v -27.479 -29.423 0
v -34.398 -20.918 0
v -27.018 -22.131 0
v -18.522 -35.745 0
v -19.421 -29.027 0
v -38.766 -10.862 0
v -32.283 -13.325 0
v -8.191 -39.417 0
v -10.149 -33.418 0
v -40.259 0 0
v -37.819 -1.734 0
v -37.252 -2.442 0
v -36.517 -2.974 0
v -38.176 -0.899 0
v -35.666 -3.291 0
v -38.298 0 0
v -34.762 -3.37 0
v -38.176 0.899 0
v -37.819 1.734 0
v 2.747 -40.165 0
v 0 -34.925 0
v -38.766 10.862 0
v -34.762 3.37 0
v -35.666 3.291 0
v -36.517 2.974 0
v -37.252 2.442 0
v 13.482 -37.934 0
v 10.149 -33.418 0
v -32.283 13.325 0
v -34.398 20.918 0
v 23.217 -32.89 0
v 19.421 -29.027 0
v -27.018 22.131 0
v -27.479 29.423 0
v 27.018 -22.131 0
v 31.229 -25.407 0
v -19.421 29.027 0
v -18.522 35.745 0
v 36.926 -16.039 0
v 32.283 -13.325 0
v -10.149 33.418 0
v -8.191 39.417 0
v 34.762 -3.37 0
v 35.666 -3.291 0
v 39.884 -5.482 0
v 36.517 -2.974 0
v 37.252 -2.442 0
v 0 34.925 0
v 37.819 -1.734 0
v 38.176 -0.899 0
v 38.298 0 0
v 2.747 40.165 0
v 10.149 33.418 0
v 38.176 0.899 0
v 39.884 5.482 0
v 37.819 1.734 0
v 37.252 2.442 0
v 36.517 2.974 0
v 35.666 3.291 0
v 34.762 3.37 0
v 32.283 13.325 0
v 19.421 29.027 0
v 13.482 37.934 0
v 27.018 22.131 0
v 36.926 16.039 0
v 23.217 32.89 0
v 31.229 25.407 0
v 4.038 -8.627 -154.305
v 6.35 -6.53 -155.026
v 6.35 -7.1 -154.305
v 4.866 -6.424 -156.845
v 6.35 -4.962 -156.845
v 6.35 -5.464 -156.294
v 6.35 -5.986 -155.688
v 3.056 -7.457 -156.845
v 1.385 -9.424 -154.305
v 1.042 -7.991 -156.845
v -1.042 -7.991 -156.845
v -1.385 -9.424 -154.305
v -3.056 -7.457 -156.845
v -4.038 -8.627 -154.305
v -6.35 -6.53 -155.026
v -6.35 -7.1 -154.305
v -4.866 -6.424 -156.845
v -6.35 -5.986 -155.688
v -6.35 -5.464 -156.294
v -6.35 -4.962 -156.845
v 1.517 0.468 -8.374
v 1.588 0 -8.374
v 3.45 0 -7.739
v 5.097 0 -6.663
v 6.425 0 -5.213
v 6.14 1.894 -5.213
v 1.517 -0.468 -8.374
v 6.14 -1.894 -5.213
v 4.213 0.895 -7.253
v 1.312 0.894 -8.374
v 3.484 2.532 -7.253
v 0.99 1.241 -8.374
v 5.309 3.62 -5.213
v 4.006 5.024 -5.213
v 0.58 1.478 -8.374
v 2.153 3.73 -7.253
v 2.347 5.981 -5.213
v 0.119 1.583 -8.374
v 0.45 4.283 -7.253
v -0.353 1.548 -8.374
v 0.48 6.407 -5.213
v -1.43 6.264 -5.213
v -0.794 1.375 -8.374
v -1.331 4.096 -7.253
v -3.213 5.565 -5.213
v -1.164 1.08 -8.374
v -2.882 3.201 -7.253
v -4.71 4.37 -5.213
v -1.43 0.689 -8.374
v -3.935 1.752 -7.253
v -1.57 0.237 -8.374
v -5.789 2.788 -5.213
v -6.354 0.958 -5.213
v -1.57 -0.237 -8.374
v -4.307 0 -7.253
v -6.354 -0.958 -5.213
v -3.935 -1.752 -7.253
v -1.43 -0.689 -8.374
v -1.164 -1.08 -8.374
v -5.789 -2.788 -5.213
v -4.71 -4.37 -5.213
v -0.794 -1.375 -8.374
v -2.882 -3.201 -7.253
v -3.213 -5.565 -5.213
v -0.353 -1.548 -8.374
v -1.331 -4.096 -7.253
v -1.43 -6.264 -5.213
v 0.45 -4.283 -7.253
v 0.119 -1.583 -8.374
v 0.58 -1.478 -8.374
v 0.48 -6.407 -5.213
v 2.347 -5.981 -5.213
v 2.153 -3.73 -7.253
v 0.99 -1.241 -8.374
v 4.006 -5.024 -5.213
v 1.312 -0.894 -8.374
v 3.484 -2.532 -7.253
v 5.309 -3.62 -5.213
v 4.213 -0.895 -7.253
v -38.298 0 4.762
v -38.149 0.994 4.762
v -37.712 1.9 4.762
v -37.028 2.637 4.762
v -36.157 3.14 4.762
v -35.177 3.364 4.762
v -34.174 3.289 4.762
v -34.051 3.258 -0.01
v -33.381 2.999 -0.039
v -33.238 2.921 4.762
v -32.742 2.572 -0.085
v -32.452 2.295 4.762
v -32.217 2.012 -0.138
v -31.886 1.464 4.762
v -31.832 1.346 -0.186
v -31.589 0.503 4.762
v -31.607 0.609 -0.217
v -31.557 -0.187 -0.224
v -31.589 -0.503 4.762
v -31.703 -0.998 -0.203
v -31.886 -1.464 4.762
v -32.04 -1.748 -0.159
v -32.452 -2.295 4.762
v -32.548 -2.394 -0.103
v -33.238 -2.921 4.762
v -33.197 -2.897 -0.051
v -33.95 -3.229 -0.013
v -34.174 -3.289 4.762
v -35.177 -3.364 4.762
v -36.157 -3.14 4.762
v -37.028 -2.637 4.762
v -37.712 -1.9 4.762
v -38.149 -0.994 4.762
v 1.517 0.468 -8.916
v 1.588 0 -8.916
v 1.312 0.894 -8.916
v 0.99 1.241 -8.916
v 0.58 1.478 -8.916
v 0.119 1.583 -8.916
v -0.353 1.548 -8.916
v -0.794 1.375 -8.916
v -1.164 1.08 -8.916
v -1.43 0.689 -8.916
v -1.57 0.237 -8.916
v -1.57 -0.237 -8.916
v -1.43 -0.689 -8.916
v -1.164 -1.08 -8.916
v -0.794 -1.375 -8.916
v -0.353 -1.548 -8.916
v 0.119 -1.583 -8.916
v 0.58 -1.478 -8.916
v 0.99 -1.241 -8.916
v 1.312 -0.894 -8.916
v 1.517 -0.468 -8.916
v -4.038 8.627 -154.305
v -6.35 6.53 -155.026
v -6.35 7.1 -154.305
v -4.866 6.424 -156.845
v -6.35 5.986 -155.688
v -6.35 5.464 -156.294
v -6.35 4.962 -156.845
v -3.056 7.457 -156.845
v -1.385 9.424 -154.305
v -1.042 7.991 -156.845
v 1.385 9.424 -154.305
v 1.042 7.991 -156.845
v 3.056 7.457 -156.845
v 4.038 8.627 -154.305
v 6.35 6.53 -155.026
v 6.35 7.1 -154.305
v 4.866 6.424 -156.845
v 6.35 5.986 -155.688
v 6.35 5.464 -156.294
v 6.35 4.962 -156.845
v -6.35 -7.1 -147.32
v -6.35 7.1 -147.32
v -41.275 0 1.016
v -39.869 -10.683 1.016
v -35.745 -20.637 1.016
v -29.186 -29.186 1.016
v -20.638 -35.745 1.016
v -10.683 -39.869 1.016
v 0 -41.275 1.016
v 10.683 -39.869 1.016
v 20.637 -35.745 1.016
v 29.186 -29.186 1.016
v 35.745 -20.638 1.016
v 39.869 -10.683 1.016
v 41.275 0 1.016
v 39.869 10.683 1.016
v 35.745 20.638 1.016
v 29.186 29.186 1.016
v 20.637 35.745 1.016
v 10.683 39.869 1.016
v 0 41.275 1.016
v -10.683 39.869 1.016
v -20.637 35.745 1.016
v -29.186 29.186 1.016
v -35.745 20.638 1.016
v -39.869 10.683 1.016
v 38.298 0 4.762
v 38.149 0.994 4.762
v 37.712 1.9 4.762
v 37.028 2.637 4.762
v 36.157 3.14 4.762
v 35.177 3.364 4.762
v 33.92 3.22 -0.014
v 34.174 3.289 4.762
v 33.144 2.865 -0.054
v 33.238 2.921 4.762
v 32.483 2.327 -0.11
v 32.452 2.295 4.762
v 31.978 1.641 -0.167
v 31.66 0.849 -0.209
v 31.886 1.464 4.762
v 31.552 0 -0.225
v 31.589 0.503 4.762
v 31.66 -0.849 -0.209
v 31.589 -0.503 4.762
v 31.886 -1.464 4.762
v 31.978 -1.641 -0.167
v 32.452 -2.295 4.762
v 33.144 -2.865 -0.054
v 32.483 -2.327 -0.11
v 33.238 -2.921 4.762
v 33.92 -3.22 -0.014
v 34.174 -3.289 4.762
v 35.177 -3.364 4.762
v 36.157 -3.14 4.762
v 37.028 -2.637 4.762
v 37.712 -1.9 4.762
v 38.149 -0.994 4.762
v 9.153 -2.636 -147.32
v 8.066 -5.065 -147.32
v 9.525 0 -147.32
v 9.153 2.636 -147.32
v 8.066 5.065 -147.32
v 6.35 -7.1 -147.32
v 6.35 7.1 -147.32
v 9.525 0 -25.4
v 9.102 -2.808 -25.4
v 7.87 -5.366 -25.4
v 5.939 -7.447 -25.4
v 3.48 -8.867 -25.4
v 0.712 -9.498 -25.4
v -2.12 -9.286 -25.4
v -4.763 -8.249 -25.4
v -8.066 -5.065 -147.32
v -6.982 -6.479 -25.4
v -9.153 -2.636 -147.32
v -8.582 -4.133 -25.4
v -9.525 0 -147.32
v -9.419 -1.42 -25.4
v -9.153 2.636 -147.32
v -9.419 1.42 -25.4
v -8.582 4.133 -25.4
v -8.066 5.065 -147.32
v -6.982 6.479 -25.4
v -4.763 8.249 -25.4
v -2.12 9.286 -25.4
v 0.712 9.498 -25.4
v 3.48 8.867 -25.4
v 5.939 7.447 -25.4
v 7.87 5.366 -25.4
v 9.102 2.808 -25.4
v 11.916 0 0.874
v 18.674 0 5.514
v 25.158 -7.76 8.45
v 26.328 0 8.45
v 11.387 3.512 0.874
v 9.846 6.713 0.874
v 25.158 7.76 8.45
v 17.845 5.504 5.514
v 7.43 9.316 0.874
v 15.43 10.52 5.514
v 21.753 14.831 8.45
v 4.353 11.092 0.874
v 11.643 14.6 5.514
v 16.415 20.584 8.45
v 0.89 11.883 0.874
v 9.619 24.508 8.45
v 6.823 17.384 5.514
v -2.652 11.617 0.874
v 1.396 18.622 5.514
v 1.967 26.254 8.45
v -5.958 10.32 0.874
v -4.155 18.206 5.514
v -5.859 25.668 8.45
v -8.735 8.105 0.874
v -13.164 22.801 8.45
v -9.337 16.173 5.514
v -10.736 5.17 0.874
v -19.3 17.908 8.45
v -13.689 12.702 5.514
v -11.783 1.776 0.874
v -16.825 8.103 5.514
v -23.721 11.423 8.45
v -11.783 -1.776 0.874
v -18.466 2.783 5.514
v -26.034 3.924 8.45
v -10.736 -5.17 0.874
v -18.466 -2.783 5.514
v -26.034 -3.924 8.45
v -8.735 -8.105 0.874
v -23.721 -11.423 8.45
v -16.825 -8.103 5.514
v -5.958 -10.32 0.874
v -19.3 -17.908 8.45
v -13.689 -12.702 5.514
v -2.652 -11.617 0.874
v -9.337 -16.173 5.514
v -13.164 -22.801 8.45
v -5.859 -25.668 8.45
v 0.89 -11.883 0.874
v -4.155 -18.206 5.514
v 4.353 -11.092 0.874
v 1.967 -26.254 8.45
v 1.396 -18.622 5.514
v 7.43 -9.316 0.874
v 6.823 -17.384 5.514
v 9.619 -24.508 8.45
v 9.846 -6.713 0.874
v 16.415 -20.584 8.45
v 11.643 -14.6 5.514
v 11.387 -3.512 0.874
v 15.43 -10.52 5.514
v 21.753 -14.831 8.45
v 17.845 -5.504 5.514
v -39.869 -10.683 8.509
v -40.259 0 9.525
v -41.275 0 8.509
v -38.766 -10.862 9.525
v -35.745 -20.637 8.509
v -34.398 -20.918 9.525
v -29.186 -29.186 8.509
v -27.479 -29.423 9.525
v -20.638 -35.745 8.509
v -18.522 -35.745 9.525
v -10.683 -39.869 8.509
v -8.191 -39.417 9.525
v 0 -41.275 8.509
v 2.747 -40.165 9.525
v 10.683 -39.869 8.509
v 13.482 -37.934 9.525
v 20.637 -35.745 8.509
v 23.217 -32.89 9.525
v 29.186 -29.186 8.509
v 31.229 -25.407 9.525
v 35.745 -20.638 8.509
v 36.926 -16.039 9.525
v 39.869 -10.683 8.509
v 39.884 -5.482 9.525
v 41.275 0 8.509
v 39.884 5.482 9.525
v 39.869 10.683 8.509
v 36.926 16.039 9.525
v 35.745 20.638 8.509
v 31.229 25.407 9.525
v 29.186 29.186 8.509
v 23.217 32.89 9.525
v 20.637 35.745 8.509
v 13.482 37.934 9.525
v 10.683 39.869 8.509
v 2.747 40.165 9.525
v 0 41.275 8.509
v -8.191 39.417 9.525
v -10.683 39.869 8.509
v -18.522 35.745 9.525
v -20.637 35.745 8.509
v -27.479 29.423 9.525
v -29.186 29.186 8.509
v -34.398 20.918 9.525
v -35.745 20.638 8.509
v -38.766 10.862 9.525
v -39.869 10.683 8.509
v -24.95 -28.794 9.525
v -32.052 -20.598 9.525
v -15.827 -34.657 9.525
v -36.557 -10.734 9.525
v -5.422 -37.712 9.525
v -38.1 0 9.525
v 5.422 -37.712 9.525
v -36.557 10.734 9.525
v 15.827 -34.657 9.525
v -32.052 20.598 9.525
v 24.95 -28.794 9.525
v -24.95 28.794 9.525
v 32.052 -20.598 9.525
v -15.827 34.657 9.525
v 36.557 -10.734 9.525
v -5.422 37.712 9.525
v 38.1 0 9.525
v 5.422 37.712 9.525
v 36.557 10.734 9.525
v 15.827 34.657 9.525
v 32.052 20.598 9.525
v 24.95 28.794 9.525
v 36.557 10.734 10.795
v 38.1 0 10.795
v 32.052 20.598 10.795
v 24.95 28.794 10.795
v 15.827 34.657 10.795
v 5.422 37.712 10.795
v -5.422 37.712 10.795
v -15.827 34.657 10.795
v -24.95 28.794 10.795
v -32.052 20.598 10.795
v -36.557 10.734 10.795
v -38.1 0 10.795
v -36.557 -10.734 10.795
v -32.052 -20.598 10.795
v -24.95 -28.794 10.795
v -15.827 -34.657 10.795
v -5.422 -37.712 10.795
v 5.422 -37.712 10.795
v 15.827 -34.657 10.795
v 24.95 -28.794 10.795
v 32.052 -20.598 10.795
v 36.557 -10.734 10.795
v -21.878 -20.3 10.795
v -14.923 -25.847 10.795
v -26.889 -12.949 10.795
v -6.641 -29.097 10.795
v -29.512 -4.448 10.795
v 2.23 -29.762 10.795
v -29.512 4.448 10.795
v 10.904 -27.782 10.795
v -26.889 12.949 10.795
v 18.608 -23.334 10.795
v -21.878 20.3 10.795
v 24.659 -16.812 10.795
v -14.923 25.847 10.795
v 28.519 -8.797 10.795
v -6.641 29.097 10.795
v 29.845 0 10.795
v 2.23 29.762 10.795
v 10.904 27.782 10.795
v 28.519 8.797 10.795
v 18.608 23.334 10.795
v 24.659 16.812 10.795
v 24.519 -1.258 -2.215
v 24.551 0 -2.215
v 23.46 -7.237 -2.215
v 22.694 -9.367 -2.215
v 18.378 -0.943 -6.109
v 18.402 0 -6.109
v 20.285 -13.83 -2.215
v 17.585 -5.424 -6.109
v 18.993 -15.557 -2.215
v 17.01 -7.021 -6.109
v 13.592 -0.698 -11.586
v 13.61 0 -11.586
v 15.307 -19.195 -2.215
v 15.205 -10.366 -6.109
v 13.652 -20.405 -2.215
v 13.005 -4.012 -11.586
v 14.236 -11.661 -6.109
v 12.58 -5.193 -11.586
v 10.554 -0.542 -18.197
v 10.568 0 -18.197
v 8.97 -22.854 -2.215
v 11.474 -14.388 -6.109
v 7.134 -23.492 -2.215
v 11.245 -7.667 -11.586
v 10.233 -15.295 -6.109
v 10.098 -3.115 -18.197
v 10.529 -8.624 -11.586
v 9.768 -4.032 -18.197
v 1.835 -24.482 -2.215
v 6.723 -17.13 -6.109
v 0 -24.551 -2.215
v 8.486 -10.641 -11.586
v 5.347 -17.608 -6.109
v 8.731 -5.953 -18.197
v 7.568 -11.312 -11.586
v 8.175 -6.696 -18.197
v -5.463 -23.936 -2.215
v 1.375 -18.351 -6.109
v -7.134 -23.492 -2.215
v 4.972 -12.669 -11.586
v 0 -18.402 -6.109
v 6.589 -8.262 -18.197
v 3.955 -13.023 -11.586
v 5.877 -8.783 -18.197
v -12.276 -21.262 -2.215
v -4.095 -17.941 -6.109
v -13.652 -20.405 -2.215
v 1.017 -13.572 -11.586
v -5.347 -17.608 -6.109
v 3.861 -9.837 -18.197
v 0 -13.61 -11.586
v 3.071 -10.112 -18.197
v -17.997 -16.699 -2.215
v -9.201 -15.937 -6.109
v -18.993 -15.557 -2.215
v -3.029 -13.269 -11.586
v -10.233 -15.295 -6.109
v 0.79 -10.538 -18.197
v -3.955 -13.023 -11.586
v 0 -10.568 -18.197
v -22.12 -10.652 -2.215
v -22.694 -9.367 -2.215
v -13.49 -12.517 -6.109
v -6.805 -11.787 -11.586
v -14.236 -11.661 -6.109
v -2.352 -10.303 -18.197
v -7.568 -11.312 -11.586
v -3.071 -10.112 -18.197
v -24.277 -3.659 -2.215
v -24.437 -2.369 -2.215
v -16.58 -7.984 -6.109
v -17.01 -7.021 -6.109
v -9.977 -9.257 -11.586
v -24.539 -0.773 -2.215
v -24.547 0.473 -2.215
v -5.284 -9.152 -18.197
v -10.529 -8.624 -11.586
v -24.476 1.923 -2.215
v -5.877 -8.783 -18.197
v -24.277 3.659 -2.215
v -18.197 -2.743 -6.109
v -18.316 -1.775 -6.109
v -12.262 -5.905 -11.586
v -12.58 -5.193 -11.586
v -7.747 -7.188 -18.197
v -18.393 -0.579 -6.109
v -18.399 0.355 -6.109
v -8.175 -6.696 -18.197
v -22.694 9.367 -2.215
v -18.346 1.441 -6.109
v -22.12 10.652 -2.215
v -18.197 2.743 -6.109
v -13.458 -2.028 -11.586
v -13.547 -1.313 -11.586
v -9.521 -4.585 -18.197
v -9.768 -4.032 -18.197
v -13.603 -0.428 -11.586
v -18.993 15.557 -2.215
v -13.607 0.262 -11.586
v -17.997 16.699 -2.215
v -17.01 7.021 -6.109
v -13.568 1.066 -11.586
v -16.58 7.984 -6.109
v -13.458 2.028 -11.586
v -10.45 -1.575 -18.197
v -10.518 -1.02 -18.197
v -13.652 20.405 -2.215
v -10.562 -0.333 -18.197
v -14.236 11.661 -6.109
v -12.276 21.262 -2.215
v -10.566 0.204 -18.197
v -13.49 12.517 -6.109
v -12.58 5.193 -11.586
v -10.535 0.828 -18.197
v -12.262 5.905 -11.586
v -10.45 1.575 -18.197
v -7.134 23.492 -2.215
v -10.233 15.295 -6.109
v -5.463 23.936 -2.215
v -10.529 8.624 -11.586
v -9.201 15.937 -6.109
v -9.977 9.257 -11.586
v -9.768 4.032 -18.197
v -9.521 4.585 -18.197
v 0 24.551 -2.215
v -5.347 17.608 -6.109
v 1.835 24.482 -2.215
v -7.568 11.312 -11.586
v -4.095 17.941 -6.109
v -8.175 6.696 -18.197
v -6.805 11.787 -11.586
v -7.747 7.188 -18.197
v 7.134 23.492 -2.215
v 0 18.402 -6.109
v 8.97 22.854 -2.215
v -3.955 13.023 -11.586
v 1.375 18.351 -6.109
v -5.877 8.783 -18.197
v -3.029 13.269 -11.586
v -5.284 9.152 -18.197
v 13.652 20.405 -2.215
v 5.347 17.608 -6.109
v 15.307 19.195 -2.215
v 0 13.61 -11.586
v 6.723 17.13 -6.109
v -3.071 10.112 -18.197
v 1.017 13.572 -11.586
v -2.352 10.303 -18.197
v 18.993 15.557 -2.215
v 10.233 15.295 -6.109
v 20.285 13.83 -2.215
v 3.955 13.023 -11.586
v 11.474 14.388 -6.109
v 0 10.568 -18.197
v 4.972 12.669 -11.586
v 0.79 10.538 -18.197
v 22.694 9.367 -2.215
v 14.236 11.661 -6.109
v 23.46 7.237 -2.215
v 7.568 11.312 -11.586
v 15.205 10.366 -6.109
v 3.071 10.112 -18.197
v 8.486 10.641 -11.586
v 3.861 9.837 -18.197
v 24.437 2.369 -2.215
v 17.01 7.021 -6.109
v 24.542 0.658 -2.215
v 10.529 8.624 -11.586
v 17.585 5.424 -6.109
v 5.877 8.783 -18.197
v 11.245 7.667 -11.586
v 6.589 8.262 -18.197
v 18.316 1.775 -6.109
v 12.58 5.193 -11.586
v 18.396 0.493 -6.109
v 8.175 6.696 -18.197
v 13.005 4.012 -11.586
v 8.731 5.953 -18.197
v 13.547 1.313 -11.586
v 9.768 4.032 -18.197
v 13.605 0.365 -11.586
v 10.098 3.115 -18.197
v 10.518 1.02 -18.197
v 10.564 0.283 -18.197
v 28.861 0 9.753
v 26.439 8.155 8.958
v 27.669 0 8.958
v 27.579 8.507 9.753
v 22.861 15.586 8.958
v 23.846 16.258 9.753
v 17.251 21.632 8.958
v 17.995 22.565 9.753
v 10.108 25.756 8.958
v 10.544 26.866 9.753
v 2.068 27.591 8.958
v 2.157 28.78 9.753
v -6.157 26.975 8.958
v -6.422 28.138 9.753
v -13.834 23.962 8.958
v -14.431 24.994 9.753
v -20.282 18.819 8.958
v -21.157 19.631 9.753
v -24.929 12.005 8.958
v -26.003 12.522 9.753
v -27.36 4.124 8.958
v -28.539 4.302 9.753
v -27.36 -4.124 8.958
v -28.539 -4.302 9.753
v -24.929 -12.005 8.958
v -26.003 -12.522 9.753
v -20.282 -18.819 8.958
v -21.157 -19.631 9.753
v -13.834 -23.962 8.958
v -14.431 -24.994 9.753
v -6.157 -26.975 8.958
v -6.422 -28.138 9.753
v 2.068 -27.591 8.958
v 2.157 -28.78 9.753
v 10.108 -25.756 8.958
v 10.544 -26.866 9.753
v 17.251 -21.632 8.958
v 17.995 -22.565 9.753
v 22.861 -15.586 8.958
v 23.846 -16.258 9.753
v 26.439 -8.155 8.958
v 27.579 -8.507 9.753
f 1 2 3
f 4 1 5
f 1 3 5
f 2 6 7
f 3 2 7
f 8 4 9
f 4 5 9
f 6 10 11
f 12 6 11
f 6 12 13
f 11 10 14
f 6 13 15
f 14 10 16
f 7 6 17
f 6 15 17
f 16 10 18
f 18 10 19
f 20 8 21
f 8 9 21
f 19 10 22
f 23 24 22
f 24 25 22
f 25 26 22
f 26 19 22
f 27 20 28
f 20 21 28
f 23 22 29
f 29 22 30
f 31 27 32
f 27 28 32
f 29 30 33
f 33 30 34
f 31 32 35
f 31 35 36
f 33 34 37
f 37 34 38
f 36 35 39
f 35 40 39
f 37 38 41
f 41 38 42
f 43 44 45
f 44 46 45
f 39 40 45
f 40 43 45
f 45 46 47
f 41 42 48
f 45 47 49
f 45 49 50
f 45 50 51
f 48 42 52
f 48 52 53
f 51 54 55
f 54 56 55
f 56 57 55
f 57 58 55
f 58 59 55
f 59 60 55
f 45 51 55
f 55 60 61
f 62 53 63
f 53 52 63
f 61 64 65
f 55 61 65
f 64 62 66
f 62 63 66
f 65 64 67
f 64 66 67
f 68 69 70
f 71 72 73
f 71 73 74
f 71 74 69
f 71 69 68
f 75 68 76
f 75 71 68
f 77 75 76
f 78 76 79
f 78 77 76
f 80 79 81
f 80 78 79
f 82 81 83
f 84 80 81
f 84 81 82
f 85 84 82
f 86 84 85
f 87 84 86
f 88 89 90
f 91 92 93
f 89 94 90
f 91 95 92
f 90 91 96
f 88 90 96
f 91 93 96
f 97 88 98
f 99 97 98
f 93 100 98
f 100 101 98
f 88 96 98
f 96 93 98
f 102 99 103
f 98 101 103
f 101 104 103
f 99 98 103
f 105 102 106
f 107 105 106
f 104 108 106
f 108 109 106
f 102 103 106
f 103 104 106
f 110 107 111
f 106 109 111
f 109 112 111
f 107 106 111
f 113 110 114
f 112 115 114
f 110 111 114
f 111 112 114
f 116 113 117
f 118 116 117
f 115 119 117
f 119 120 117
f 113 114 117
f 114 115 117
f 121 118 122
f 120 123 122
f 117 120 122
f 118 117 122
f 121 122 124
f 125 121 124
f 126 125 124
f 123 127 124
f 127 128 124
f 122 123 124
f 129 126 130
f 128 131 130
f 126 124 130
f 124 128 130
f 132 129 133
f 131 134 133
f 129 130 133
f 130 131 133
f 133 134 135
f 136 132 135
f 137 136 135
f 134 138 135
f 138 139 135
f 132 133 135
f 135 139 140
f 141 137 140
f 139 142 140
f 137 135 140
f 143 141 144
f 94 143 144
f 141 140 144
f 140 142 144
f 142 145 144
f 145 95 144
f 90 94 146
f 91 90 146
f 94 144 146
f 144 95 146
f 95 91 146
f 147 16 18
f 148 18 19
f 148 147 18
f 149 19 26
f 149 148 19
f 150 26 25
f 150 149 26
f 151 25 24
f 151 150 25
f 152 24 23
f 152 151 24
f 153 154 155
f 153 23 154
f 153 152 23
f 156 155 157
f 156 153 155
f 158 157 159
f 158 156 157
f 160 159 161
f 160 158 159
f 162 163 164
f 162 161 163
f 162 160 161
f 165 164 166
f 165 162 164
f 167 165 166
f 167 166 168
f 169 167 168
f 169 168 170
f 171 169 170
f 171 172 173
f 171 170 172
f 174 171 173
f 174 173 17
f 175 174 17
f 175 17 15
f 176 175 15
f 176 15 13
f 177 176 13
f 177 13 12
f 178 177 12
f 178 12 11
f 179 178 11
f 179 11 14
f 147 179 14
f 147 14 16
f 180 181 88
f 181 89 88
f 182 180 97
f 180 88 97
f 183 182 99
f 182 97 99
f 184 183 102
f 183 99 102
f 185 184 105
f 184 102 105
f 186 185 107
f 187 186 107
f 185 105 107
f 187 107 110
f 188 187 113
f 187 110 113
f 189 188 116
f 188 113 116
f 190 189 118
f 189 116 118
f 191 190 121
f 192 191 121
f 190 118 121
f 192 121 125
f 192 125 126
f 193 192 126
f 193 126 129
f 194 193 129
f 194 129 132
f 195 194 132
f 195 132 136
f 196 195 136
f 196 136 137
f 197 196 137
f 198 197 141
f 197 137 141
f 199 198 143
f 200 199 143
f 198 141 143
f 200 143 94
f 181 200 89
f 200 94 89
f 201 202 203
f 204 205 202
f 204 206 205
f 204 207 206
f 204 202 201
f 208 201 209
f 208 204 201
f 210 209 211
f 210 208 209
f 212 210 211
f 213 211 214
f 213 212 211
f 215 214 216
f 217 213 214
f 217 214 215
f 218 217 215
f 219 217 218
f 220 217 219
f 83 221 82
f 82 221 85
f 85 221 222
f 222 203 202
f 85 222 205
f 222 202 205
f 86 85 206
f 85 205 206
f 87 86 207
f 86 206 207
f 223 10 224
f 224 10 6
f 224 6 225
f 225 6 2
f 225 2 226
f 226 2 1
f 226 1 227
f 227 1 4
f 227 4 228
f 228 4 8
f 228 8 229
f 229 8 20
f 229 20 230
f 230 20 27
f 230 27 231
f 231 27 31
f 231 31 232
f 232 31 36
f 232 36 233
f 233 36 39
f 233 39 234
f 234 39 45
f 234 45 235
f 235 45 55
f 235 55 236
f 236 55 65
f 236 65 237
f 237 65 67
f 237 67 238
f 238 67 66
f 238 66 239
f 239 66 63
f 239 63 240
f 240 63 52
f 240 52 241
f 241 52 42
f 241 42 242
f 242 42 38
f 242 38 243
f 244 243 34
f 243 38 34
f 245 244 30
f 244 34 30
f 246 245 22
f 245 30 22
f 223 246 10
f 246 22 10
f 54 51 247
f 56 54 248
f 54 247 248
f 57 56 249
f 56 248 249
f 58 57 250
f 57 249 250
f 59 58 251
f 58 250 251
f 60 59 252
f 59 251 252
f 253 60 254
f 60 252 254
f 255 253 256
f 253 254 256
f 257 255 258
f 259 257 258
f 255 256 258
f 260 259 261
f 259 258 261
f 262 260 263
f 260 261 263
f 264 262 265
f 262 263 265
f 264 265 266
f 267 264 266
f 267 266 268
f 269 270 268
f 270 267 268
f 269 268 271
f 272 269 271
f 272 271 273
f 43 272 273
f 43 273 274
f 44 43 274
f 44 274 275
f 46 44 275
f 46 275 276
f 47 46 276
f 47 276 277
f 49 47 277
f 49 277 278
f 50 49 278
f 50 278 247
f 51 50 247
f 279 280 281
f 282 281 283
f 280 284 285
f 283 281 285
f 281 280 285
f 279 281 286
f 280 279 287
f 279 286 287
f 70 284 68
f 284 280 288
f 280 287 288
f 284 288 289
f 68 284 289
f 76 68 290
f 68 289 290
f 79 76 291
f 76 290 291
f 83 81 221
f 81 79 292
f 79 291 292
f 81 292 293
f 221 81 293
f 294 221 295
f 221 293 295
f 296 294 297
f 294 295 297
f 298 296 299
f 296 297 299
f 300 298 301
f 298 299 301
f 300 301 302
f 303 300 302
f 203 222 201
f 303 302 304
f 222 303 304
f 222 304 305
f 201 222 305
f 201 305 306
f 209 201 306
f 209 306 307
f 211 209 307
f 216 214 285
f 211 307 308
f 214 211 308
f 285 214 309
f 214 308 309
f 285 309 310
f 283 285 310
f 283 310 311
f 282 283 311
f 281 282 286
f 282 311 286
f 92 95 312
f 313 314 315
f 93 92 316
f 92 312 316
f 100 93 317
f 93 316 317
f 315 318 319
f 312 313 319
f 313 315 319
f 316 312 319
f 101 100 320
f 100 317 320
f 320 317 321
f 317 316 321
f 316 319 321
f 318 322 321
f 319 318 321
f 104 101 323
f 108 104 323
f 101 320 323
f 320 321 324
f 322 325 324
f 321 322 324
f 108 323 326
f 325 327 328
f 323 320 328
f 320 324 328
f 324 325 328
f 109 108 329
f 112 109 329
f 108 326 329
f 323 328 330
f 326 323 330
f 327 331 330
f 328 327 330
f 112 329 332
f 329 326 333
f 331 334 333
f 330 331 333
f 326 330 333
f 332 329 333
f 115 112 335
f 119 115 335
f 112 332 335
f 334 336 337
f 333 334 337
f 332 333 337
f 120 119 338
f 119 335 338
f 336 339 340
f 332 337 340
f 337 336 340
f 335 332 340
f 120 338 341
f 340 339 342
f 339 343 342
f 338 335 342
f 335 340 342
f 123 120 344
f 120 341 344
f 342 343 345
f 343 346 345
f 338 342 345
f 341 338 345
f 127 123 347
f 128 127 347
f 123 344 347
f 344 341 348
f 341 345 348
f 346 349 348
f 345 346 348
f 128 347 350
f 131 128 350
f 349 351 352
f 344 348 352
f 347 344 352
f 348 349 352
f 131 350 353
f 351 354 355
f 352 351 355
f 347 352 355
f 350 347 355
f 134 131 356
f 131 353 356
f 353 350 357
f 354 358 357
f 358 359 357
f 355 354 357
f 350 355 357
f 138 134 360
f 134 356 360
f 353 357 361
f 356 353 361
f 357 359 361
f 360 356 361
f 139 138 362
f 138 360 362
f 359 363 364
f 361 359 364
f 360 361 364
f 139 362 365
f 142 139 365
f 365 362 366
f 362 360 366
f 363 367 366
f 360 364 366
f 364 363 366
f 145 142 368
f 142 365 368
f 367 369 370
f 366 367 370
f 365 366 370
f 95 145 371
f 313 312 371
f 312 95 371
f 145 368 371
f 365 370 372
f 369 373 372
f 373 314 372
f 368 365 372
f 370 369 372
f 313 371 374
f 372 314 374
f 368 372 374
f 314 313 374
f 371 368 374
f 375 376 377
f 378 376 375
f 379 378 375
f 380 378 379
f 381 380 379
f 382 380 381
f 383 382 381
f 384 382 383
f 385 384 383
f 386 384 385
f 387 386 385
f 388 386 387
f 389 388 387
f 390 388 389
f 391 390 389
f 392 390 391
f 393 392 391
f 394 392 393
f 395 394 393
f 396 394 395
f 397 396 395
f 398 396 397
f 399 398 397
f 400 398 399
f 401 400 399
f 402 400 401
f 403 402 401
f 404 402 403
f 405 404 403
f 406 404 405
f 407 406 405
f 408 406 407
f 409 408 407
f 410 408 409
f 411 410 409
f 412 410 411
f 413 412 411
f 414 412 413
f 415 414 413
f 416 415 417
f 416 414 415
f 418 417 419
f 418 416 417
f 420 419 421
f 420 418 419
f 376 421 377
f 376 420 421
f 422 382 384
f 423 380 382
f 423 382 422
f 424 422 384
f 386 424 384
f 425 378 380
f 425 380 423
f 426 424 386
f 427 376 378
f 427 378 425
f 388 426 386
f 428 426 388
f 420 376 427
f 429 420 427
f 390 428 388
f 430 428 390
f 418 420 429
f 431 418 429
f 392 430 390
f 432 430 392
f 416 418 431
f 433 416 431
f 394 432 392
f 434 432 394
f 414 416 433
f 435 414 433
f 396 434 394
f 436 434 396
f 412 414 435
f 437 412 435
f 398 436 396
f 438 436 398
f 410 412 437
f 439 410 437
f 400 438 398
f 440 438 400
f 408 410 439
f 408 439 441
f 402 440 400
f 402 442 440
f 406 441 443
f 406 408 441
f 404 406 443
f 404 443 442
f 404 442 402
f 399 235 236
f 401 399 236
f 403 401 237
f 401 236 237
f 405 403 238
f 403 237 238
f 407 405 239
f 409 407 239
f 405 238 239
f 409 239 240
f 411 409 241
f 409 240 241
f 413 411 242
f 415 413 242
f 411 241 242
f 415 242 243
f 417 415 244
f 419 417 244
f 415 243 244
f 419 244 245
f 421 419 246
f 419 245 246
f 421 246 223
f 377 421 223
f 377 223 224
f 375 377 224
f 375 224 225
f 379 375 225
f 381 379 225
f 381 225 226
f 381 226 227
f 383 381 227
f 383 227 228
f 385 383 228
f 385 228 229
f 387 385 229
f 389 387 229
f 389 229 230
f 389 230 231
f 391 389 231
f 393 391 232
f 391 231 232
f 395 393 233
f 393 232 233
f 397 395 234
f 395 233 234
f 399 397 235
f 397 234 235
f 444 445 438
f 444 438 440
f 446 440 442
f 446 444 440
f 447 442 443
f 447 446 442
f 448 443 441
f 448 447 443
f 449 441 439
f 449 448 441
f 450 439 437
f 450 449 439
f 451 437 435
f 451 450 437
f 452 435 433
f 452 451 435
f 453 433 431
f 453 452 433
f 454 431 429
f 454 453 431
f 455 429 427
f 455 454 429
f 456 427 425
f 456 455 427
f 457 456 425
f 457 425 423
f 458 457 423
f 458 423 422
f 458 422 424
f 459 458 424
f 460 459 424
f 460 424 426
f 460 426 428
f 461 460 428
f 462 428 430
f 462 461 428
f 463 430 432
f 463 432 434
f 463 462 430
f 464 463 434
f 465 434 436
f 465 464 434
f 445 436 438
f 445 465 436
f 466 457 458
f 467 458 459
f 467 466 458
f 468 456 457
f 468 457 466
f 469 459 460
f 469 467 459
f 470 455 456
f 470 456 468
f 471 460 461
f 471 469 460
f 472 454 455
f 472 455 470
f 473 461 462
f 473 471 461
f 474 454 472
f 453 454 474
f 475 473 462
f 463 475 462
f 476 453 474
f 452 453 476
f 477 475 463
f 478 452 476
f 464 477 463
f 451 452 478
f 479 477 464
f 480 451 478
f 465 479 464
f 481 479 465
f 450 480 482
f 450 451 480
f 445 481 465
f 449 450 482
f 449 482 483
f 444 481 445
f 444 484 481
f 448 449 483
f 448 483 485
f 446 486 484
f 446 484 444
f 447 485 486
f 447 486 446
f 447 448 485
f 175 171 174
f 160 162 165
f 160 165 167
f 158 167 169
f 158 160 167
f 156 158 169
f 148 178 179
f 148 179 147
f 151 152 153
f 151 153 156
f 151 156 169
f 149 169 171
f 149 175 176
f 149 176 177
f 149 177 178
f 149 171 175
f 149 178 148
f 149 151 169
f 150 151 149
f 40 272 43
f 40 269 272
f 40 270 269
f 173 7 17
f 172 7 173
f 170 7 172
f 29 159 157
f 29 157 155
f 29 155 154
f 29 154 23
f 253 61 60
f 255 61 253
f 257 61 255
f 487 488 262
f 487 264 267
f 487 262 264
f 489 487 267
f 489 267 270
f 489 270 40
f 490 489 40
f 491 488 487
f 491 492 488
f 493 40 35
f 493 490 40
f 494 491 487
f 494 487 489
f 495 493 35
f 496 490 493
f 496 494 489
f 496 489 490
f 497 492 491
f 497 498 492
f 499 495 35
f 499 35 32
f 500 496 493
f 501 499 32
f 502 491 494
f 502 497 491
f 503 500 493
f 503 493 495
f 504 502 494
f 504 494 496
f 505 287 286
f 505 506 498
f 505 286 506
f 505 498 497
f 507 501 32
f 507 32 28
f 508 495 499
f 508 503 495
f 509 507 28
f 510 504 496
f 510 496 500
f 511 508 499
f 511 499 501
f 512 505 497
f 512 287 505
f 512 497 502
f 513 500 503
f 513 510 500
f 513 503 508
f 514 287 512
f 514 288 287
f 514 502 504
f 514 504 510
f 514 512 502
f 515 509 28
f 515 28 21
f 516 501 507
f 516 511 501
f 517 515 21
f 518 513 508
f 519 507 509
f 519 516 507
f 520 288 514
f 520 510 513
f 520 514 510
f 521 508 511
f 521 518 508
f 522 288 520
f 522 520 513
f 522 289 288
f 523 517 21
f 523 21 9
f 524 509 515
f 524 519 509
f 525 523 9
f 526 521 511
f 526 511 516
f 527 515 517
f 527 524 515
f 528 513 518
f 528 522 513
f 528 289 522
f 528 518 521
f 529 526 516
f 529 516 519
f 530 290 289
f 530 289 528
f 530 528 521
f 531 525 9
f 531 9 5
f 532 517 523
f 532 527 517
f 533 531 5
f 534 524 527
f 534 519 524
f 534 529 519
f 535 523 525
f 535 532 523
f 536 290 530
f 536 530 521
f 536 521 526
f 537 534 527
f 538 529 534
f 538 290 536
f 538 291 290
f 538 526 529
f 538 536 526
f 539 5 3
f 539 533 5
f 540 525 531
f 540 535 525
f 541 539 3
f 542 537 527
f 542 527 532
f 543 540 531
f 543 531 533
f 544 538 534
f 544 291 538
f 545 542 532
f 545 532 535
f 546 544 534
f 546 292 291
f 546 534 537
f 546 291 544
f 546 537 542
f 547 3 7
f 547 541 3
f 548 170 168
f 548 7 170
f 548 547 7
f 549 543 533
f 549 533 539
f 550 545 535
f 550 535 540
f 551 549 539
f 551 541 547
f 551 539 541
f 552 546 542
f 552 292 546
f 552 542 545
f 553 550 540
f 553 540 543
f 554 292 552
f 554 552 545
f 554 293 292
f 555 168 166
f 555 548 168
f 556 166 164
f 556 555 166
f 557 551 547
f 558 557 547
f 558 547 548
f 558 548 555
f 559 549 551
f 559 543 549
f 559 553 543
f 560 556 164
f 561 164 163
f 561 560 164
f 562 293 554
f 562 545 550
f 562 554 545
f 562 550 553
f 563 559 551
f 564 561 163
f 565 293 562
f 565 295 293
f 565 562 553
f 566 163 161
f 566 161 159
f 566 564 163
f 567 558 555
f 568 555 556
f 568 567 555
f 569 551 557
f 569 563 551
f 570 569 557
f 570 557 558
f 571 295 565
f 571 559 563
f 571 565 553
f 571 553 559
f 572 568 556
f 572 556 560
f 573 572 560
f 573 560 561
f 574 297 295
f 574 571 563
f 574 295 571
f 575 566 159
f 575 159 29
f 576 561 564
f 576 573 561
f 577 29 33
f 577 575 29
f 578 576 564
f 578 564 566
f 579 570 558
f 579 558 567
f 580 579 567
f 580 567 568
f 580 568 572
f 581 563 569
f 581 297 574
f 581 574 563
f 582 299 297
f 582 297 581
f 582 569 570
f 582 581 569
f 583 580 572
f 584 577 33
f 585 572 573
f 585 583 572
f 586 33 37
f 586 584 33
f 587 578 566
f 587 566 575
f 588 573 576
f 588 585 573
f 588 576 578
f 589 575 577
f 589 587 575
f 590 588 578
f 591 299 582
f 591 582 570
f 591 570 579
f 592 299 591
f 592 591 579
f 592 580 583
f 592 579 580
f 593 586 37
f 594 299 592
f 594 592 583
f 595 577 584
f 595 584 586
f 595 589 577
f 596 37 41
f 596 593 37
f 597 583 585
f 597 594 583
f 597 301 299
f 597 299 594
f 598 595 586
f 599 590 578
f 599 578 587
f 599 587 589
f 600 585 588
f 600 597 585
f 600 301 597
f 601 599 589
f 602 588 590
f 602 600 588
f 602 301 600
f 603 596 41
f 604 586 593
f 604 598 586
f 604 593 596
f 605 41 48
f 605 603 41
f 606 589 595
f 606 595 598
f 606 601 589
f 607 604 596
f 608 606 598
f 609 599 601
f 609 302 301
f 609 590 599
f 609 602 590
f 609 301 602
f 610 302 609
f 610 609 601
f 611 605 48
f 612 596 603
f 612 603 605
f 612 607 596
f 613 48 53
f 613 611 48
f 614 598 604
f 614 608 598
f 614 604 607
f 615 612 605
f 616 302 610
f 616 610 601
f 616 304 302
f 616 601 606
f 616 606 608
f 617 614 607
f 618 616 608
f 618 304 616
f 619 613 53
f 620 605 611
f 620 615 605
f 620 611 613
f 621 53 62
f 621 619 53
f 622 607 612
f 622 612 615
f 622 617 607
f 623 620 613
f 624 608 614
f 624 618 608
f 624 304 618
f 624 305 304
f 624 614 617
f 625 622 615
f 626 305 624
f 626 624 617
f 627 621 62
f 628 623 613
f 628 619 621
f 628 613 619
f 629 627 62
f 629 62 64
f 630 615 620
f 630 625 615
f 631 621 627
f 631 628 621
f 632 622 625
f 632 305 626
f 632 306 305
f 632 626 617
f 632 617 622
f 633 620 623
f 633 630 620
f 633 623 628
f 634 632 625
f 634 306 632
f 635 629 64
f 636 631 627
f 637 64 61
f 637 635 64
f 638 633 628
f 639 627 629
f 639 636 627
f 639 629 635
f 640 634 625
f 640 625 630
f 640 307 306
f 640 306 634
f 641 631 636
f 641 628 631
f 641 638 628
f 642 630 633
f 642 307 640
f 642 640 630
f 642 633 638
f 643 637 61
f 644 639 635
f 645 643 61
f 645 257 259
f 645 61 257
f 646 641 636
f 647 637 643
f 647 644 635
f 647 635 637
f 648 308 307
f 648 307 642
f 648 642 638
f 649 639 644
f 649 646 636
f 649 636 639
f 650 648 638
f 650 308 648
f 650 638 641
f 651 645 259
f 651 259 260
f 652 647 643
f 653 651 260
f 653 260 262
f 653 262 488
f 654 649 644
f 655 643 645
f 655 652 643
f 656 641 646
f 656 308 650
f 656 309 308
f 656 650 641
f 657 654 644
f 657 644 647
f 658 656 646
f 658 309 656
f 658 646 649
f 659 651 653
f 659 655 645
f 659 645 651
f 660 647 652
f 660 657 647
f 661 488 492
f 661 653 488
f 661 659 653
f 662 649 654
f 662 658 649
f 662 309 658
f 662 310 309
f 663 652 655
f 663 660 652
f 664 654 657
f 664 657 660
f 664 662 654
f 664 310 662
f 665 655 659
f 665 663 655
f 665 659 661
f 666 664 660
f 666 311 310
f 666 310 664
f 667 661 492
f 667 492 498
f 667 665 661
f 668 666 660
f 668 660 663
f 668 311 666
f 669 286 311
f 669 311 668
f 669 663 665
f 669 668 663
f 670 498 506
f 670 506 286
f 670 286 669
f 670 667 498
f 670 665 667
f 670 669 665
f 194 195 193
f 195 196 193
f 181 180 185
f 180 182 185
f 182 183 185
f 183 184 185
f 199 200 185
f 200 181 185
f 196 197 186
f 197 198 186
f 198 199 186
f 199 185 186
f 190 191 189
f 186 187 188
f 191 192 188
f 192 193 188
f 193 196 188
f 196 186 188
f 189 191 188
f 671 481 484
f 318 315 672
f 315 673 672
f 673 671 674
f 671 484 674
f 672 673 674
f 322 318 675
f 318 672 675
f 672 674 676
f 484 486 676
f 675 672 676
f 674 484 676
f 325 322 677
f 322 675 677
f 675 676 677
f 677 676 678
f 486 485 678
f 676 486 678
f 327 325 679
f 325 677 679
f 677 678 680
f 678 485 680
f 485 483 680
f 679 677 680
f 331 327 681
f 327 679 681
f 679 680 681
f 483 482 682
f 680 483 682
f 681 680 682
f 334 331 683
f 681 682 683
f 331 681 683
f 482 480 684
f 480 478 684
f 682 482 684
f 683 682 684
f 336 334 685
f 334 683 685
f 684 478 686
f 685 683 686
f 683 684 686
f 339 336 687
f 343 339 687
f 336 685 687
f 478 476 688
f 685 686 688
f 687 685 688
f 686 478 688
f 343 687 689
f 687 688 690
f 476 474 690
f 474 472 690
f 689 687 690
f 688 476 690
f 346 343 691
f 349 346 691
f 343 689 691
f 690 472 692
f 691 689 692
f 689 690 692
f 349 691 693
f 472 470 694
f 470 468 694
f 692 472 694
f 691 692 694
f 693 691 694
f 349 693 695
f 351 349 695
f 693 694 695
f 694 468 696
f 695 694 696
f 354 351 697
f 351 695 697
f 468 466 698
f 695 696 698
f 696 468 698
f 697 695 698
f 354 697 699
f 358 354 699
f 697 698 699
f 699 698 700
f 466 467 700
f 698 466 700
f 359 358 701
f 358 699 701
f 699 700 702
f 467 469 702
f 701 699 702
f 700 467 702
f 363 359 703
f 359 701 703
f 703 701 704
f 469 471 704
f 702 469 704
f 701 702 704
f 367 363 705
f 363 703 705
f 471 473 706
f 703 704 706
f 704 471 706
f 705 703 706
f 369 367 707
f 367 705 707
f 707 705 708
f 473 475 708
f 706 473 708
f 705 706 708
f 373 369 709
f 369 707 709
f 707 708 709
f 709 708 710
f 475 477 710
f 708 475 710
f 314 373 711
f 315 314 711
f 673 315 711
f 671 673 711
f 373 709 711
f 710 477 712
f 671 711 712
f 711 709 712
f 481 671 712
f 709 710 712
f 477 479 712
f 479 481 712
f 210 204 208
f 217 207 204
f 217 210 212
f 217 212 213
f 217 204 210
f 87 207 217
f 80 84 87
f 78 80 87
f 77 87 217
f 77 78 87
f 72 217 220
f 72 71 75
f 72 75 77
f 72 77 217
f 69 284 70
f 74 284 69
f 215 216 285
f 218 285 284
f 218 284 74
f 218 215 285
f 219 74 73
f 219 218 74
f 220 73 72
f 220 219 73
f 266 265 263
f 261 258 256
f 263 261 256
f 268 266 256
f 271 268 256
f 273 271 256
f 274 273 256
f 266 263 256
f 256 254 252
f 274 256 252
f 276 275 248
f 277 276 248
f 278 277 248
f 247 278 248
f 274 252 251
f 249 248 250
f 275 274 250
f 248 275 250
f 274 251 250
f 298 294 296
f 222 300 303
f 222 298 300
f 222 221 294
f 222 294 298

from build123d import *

# Parameters (mm, degrees)
SKETCH1_R           = 41.275
BASE_EXTRUDE_DEPTH  = 10.795
SKETCH6_R           = 9.525
BOSS_EXTRUDE2_DEPTH = 156.845
FILLET1_R           = 25.4
CUT_EXTRUDE2_START  = -4.7625
SKETCH9_R           = 3.3734375
CUT_EXTRUDE2_DEPTH  = 162.6075
SKETCH26_R          = 69.037542482
SKETCH26_R_2        = 38.1
CUT_EXTRUDE7_DEPTH  = 1.27
SKETCH19_W          = 6.35
SKETCH19_H          = 9.525
CUT_EXTRUDE6_DEPTH  = 42.275


with BuildPart() as part:
    # Sketch1 → Base-Extrude (new body)
    with BuildSketch(Plane.XY):
        Circle(SKETCH1_R)
    extrude(amount=BASE_EXTRUDE_DEPTH)

    # Sketch6 → Boss-Extrude2 (add)
    with BuildSketch(Plane(origin=(0, 0, 0), x_dir=(-1, 0, 0), z_dir=(0, 0, -1))):
        with Locations(Location((0, 0, 0), (0, 0, 180))):  # turned: the seam where the file's is
            Circle(SKETCH6_R)
    extrude(amount=BOSS_EXTRUDE2_DEPTH)

    # Fillet1
    fillet1_edges = [part.edges().sort_by_distance(p)[0] for p in [
        (-9.525, 0, 0),
    ]]
    fillet(fillet1_edges, radius=FILLET1_R)

    # Sketch9 → Cut-Extrude2 (cut)
    with BuildSketch(Plane(origin=(0, 0, 0), x_dir=(-1, 0, 0), z_dir=(0, 0, -1)).offset(CUT_EXTRUDE2_START)):
        with Locations((34.925, 0)):
            Circle(SKETCH9_R)
    cut_extrude2 = extrude(amount=CUT_EXTRUDE2_DEPTH, mode=Mode.SUBTRACT)

    # Mirror1: Cut-Extrude2 across plane
    add(cut_extrude2.mirror(Plane(origin=(0, 0, 0), x_dir=(0, 0, 1), z_dir=(1, 0, 0))), mode=Mode.SUBTRACT)

    # Sketch26 → Cut-Extrude7 (cut)
    with BuildSketch(Plane.XY.offset(10.795)):
        Circle(SKETCH26_R)
        Circle(SKETCH26_R_2, mode=Mode.SUBTRACT)
    extrude(amount=-CUT_EXTRUDE7_DEPTH, mode=Mode.SUBTRACT)

    # Sketch19 → Cut-Extrude6 (cut, symmetric)
    with BuildSketch(Plane(origin=(0, 0, 0), x_dir=(1, 0, 0), z_dir=(0, 1, 0))):
        with Locations((9.525, 152.0825)):
            Rectangle(SKETCH19_W, SKETCH19_H)
    cut_extrude6 = extrude(amount=CUT_EXTRUDE6_DEPTH, both=True, mode=Mode.SUBTRACT)

    # Mirror2: Cut-Extrude6 across plane
    add(cut_extrude6.mirror(Plane(origin=(0, 0, 0), x_dir=(0, 0, 1), z_dir=(1, 0, 0))), mode=Mode.SUBTRACT)

    # Sketch21 → Cut-Revolve6 (revolve, cut)
    with BuildSketch(Plane(origin=(0, 0, 0), x_dir=(1, 0, 0), z_dir=(0, 1, 0))):
        with BuildLine():
            Line((29.845, -10.795), (0, -10.795))
            Line((0, -10.795), (0, 8.916390985))
            Line((0, 8.916390985), (1.5875, 8.916390985))
            Line((1.5875, 8.916390985), (1.5875, 8.37370061))
            ThreePointArc((1.5875, 8.37370061), (4.306912353, 7.253081359), (6.42537092, 5.212707777))
            ThreePointArc((6.42537092, 5.212707777), (15.158650592, -3.393177249), (26.328076923, -8.450384615))
            ThreePointArc((26.328076923, -8.450384615), (28.287346246, -9.321480631), (29.845, -10.795))
        make_face()
    revolve(axis=Axis((0, 0, 10.795), (0, 0, 1)), mode=Mode.SUBTRACT)

    # Sketch22 → Cut-Revolve7 (revolve, cut)
    with BuildSketch(Plane(origin=(0, 0, 0), x_dir=(1, 0, 0), z_dir=(0, 1, 0))):
        Polygon((8.058530316, 156.845), (9.525, 156.845), (9.525, 154.305), align=None)
    revolve(axis=Axis((0, 0, 10.795), (0, 0, -1)), mode=Mode.SUBTRACT)

    # Sketch23 → Cut-Revolve8 (revolve, cut)
    with BuildSketch(Plane(origin=(0, 0, 0), x_dir=(1, 0, 0), z_dir=(0, 1, 0)), mode=Mode.PRIVATE) as cut_revolve8_sk:
        Polygon((40.259, 0), (41.275, 0), (41.275, -1.016), align=None)
        Polygon((40.259, -9.525), (41.275, -9.525), (41.275, -8.509), align=None)
    revolve(cut_revolve8_sk.sketch.rotate(Axis((0, 0, 10.795), (0, 0, 1)), 180), axis=Axis((0, 0, 10.795), (0, 0, 1)), mode=Mode.SUBTRACT)  # turned: the seam where the file's is


solid = part.part
